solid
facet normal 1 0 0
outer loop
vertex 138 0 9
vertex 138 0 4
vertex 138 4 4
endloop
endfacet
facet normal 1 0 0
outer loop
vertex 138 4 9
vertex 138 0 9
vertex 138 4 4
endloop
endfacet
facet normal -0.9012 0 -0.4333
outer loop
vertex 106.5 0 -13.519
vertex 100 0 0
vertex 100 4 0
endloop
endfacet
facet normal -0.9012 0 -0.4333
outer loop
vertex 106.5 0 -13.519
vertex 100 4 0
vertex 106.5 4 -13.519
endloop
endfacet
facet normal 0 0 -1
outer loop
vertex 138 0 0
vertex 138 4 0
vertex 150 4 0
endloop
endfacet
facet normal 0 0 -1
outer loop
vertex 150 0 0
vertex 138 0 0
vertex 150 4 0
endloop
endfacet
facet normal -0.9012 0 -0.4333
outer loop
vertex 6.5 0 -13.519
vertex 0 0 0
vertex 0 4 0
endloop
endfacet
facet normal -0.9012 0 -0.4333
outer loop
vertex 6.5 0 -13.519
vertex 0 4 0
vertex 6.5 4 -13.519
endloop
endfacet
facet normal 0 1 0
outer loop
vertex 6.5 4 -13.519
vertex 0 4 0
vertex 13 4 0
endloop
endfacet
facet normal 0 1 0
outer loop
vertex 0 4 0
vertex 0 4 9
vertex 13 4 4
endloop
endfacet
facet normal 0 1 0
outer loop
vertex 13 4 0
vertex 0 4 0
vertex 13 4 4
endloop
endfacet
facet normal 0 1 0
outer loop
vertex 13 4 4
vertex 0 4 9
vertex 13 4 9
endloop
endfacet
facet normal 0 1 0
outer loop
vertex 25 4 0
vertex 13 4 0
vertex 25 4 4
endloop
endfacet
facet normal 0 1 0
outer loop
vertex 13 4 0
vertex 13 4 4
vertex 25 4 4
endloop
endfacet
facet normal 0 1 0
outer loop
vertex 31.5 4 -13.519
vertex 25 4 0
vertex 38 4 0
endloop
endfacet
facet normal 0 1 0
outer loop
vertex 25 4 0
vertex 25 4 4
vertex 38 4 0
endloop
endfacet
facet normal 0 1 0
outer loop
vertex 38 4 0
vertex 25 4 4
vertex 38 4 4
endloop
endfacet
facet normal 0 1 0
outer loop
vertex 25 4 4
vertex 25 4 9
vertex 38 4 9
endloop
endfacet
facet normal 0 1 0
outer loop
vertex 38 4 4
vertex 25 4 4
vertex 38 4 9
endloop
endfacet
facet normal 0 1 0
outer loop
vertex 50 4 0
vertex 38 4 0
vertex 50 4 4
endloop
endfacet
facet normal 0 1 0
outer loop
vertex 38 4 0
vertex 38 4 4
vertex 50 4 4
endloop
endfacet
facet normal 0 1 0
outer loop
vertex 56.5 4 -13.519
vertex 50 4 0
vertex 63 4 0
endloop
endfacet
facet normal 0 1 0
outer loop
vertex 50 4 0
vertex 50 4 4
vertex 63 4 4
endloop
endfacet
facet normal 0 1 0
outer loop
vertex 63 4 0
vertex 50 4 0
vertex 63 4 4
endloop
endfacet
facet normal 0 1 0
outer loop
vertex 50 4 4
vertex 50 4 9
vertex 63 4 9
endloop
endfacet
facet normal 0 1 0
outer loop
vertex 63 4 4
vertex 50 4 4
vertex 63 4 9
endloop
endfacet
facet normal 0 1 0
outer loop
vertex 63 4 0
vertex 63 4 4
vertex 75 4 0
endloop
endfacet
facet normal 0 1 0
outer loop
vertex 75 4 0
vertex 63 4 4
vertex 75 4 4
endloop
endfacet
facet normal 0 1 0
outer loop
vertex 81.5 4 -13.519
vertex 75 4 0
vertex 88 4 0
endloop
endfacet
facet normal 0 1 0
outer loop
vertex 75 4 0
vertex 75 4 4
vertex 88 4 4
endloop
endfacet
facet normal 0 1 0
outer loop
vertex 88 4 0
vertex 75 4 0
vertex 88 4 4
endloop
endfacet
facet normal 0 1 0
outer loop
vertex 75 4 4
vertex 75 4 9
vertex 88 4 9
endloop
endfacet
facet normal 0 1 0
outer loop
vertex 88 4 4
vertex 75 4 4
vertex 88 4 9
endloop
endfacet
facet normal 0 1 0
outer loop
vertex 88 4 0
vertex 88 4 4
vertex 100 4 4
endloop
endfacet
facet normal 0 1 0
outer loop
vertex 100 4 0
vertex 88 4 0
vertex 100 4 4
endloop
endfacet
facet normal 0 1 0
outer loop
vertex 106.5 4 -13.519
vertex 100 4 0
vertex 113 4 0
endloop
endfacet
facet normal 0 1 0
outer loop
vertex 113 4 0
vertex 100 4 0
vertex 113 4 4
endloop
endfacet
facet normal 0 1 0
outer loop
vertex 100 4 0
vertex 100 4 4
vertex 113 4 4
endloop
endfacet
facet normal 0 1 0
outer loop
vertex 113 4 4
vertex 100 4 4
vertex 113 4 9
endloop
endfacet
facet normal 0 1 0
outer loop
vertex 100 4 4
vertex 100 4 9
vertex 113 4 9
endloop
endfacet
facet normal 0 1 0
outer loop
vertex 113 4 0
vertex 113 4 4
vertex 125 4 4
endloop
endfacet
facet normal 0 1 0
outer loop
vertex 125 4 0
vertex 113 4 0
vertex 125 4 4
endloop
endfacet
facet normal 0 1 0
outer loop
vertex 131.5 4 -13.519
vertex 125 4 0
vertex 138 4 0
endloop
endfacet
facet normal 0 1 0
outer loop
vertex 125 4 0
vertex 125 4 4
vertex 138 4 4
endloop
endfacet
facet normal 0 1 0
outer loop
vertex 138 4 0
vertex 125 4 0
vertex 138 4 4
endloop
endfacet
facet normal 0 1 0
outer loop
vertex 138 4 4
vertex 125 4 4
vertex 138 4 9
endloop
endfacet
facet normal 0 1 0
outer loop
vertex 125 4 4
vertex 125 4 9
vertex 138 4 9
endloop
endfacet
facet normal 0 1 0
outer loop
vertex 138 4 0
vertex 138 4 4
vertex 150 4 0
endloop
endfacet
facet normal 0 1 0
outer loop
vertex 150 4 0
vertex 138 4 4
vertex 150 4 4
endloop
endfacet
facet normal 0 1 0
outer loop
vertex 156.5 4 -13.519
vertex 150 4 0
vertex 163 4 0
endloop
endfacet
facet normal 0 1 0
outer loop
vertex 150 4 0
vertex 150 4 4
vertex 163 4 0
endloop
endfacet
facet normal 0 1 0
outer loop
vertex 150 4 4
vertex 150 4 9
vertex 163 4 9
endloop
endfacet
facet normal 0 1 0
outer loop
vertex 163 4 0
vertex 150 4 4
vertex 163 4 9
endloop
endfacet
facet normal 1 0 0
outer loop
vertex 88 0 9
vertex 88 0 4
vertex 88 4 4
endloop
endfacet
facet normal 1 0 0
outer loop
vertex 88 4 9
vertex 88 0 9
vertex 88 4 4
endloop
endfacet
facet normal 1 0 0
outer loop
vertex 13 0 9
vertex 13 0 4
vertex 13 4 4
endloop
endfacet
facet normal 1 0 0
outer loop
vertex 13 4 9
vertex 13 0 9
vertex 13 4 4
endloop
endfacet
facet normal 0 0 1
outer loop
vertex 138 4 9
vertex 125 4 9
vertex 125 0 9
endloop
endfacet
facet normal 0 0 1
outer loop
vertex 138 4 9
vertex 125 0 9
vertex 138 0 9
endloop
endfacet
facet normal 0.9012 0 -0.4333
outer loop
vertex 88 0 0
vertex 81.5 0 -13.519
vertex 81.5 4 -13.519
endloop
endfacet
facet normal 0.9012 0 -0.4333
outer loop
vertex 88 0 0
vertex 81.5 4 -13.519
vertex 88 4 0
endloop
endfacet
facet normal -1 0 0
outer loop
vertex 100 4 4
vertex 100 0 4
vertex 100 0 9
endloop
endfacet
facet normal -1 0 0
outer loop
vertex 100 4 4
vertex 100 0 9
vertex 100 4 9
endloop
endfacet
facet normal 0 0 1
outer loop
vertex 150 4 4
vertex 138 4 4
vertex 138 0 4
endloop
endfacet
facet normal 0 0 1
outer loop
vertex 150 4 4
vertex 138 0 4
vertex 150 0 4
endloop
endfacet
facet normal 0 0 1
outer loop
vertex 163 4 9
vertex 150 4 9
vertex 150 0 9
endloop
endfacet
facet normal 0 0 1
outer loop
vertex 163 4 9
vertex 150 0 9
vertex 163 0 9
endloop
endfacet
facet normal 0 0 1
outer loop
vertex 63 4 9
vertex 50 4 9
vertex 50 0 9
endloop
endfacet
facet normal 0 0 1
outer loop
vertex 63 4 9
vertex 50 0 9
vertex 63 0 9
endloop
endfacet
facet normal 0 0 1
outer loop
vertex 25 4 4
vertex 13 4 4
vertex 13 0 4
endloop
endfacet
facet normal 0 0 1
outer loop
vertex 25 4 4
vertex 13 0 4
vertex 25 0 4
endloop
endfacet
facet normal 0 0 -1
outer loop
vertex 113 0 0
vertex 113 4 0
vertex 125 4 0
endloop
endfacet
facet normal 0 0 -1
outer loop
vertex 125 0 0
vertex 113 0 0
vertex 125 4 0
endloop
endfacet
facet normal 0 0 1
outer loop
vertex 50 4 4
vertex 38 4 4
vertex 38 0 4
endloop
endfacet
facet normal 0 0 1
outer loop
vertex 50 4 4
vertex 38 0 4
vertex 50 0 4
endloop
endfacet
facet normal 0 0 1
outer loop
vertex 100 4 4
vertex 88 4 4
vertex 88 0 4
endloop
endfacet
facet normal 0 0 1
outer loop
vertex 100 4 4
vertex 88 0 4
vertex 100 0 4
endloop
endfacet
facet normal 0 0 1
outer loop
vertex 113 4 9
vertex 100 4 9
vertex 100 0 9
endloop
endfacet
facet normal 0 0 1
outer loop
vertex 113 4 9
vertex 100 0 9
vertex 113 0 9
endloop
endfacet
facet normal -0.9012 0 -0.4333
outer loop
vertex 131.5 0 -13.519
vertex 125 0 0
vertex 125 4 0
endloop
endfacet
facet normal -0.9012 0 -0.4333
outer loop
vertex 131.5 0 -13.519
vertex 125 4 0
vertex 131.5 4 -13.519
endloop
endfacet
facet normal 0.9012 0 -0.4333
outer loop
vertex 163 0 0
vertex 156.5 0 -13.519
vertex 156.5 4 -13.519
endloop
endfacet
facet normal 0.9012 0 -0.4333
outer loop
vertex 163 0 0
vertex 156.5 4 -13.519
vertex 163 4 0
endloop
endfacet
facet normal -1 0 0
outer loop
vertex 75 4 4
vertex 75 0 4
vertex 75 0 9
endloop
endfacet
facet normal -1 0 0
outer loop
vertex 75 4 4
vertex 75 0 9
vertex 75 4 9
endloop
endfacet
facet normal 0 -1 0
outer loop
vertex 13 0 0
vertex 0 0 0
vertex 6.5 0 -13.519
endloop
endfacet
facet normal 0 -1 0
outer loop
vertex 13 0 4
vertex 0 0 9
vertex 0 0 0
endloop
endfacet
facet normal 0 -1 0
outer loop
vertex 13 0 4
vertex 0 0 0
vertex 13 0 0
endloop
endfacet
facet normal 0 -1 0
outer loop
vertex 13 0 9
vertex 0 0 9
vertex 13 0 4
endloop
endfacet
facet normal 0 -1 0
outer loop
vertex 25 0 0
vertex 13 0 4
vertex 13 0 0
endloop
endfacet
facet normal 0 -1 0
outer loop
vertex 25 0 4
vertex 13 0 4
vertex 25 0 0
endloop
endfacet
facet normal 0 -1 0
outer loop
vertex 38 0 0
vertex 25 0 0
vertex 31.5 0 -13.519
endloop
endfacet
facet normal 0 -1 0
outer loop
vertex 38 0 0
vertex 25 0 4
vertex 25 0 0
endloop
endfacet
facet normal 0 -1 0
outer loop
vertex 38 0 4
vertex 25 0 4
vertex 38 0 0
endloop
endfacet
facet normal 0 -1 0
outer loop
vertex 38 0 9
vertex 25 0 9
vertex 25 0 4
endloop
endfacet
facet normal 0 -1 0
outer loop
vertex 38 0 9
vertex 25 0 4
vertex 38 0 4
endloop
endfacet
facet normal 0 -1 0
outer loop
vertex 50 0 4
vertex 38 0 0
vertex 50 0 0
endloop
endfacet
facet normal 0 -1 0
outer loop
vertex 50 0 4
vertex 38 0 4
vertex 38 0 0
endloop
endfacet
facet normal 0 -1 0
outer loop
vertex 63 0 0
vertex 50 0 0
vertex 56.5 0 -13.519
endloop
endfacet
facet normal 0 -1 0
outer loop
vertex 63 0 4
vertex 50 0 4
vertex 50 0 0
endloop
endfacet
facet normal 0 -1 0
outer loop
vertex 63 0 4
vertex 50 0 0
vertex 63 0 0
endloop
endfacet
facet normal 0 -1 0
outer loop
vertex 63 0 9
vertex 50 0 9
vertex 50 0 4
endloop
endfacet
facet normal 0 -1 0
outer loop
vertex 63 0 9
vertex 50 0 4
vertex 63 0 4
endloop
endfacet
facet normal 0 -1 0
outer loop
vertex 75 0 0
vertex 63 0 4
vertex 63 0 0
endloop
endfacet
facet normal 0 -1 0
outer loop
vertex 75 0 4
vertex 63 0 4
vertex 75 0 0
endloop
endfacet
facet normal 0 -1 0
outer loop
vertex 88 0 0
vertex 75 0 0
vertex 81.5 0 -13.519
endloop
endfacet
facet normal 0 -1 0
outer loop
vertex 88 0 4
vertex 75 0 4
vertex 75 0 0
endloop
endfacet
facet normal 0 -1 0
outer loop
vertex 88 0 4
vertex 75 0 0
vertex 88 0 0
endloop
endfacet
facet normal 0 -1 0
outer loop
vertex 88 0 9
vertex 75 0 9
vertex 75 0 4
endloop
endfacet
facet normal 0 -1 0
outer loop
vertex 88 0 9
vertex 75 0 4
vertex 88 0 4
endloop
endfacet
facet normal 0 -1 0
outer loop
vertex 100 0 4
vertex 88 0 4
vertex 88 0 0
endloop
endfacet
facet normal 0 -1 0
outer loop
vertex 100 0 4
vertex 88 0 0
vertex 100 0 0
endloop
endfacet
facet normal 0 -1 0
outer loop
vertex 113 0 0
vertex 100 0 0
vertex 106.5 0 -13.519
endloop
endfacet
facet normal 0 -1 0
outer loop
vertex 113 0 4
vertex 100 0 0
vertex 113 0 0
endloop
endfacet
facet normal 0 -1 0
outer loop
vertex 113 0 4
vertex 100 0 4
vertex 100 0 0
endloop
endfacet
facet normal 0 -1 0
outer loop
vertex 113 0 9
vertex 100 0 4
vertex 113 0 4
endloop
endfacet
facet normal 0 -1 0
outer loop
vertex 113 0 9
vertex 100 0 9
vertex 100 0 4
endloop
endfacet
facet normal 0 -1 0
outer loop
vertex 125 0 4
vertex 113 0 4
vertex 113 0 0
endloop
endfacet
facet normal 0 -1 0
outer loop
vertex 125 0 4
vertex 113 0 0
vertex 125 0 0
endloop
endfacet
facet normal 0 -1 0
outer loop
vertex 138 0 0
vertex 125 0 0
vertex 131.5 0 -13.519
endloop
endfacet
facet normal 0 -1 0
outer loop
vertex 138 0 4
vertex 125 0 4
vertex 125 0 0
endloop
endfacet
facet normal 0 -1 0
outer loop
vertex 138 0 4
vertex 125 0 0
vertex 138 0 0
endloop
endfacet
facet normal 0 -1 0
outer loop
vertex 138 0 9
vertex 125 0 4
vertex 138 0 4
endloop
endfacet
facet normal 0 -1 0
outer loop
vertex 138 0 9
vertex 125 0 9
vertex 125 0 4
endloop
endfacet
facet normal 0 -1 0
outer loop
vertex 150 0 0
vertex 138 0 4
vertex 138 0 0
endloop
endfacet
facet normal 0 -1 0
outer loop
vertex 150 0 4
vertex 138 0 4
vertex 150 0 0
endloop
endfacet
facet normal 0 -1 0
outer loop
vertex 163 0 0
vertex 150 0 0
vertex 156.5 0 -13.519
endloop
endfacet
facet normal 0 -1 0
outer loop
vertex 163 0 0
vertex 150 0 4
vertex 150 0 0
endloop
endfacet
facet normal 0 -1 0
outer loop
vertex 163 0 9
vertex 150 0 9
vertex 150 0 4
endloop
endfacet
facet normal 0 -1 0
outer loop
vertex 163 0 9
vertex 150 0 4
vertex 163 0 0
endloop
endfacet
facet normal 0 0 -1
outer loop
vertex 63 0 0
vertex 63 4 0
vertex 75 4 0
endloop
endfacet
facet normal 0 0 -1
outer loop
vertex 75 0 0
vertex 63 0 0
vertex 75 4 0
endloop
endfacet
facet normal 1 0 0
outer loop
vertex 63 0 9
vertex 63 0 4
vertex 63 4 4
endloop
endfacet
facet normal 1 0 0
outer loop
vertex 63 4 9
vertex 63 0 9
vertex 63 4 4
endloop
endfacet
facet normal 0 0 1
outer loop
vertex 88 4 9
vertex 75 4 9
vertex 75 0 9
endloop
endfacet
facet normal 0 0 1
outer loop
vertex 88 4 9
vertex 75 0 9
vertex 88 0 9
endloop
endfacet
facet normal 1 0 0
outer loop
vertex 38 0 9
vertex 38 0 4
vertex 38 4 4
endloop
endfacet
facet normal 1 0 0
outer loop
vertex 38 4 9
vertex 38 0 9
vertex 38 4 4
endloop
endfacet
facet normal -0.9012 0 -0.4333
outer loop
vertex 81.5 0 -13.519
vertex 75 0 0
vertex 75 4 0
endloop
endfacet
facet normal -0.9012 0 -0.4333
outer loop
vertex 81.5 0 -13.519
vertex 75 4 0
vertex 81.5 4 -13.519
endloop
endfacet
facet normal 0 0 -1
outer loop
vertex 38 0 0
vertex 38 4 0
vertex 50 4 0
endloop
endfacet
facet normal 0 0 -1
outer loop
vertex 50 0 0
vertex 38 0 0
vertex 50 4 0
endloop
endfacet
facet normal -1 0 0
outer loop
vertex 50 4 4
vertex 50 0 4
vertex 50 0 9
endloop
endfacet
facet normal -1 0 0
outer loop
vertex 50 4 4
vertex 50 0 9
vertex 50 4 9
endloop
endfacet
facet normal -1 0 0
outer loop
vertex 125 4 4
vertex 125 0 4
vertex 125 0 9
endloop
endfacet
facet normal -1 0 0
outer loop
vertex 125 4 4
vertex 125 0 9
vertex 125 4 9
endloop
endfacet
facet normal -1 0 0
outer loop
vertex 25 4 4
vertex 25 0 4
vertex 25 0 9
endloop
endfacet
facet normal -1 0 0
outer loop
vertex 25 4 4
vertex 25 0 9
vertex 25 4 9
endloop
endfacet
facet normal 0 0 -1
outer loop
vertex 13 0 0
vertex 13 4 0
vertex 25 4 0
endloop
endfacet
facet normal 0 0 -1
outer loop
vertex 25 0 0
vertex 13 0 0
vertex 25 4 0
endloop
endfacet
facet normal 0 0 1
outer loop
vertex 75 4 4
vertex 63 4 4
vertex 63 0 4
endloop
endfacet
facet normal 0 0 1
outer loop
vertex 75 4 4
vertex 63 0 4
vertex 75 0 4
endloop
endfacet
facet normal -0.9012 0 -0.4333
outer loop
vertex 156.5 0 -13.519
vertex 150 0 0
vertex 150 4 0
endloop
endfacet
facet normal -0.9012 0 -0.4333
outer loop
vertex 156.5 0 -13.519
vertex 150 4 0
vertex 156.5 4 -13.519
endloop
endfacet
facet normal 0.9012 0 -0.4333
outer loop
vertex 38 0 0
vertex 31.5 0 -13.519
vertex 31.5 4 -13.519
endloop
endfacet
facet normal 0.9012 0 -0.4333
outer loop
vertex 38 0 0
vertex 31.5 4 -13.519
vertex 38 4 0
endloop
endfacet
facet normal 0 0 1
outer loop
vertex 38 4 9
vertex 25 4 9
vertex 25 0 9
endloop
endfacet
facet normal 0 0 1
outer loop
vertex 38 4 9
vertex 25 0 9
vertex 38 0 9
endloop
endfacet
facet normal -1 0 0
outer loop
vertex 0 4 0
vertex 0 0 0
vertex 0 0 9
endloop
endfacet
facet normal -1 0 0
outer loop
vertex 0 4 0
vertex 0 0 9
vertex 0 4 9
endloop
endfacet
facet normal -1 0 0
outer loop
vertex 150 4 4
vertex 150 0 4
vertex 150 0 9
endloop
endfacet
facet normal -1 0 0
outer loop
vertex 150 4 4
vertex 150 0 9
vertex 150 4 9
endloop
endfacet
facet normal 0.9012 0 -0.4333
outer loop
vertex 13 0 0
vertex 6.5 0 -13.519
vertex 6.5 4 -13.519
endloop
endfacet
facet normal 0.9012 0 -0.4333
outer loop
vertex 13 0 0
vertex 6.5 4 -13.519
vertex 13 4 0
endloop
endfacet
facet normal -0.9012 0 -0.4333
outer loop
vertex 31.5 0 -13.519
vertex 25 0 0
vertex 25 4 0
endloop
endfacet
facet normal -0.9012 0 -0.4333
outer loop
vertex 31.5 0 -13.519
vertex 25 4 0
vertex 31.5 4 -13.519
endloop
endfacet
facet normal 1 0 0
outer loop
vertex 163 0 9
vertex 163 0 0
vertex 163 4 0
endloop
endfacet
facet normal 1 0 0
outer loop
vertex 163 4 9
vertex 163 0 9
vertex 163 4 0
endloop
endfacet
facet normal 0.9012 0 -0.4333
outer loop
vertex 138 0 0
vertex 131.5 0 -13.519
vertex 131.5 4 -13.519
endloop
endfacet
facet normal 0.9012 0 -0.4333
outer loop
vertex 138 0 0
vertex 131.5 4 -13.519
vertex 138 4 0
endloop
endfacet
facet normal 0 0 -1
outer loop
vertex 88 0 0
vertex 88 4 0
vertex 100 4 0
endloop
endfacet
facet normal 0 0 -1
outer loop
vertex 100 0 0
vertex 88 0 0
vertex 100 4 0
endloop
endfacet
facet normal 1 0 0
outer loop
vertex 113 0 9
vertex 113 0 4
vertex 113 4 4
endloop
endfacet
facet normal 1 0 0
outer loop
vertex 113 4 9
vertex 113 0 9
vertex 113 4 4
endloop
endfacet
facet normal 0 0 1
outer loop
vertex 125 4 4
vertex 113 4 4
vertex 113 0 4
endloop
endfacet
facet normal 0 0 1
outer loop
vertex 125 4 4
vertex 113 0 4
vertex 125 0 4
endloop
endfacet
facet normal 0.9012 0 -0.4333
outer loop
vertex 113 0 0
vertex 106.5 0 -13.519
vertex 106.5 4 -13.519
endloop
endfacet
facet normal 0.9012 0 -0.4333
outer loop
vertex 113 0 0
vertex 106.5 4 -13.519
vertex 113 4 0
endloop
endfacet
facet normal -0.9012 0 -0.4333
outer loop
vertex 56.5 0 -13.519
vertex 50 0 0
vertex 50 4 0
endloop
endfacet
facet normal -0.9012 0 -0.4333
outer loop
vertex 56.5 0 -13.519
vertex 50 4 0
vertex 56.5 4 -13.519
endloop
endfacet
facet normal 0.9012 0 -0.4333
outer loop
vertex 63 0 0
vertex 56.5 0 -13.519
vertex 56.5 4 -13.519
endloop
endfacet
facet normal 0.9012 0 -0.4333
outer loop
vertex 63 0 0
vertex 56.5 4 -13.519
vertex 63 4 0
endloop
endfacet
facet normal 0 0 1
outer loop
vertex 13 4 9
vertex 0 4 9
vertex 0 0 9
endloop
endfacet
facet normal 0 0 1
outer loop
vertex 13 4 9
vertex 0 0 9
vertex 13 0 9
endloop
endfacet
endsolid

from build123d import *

# Parameters (mm, degrees)
F0_W     = 13
F0_H     = 4
F0_W_2   = 12
F1_DEPTH = 4
F2_DEPTH = 9
F4_DEPTH = 4


with BuildPart() as f1:
    # F0 (on Top) → F1 (new body)
    with BuildSketch(Plane.XY):
        with Locations((6.5, 2)):
            Rectangle(F0_W, F0_H)
        with Locations((19, 2)):
            Rectangle(F0_W_2, F0_H)
        with Locations((31.5, 2)):
            Rectangle(F0_W, F0_H)
        with Locations((44, 2)):
            Rectangle(F0_W_2, F0_H)
        with Locations((56.5, 2)):
            Rectangle(F0_W, F0_H)
        with Locations((69, 2)):
            Rectangle(F0_W_2, F0_H)
        with Locations((81.5, 2)):
            Rectangle(F0_W, F0_H)
        with Locations((94, 2)):
            Rectangle(F0_W_2, F0_H)
        with Locations((106.5, 2)):
            Rectangle(F0_W, F0_H)
        with Locations((119, 2)):
            Rectangle(F0_W_2, F0_H)
        with Locations((131.5, 2)):
            Rectangle(F0_W, F0_H)
        with Locations((144, 2)):
            Rectangle(F0_W_2, F0_H)
        with Locations((156.5, 2)):
            Rectangle(F0_W, F0_H)
    extrude(amount=F1_DEPTH)

    # F0 (on Top) → F2 (join)
    with BuildSketch(Plane.XY):
        with Locations((6.5, 2)):
            Rectangle(F0_W, F0_H)
        with Locations((31.5, 2)):
            Rectangle(F0_W, F0_H)
        with Locations((56.5, 2)):
            Rectangle(F0_W, F0_H)
        with Locations((81.5, 2)):
            Rectangle(F0_W, F0_H)
        with Locations((106.5, 2)):
            Rectangle(F0_W, F0_H)
        with Locations((131.5, 2)):
            Rectangle(F0_W, F0_H)
        with Locations((156.5, 2)):
            Rectangle(F0_W, F0_H)
    extrude(amount=F2_DEPTH)

    # F3 (on face) → F4 (join)
    with BuildSketch(Plane.XZ):
        Polygon((13, 0), (0, 0), (6.5, -13.518506), align=None)
        Polygon((38, 0), (25, 0), (31.5, -13.518506), align=None)
        Polygon((63, 0), (50, 0), (56.5, -13.518506), align=None)
        Polygon((88, 0), (75, 0), (81.5, -13.518506), align=None)
        Polygon((113, 0), (100, 0), (106.5, -13.518506), align=None)
        Polygon((138, 0), (125, 0), (131.5, -13.518506), align=None)
        Polygon((163, 0), (150, 0), (156.5, -13.518506), align=None)
    extrude(amount=-F4_DEPTH)


solid = f1.part
